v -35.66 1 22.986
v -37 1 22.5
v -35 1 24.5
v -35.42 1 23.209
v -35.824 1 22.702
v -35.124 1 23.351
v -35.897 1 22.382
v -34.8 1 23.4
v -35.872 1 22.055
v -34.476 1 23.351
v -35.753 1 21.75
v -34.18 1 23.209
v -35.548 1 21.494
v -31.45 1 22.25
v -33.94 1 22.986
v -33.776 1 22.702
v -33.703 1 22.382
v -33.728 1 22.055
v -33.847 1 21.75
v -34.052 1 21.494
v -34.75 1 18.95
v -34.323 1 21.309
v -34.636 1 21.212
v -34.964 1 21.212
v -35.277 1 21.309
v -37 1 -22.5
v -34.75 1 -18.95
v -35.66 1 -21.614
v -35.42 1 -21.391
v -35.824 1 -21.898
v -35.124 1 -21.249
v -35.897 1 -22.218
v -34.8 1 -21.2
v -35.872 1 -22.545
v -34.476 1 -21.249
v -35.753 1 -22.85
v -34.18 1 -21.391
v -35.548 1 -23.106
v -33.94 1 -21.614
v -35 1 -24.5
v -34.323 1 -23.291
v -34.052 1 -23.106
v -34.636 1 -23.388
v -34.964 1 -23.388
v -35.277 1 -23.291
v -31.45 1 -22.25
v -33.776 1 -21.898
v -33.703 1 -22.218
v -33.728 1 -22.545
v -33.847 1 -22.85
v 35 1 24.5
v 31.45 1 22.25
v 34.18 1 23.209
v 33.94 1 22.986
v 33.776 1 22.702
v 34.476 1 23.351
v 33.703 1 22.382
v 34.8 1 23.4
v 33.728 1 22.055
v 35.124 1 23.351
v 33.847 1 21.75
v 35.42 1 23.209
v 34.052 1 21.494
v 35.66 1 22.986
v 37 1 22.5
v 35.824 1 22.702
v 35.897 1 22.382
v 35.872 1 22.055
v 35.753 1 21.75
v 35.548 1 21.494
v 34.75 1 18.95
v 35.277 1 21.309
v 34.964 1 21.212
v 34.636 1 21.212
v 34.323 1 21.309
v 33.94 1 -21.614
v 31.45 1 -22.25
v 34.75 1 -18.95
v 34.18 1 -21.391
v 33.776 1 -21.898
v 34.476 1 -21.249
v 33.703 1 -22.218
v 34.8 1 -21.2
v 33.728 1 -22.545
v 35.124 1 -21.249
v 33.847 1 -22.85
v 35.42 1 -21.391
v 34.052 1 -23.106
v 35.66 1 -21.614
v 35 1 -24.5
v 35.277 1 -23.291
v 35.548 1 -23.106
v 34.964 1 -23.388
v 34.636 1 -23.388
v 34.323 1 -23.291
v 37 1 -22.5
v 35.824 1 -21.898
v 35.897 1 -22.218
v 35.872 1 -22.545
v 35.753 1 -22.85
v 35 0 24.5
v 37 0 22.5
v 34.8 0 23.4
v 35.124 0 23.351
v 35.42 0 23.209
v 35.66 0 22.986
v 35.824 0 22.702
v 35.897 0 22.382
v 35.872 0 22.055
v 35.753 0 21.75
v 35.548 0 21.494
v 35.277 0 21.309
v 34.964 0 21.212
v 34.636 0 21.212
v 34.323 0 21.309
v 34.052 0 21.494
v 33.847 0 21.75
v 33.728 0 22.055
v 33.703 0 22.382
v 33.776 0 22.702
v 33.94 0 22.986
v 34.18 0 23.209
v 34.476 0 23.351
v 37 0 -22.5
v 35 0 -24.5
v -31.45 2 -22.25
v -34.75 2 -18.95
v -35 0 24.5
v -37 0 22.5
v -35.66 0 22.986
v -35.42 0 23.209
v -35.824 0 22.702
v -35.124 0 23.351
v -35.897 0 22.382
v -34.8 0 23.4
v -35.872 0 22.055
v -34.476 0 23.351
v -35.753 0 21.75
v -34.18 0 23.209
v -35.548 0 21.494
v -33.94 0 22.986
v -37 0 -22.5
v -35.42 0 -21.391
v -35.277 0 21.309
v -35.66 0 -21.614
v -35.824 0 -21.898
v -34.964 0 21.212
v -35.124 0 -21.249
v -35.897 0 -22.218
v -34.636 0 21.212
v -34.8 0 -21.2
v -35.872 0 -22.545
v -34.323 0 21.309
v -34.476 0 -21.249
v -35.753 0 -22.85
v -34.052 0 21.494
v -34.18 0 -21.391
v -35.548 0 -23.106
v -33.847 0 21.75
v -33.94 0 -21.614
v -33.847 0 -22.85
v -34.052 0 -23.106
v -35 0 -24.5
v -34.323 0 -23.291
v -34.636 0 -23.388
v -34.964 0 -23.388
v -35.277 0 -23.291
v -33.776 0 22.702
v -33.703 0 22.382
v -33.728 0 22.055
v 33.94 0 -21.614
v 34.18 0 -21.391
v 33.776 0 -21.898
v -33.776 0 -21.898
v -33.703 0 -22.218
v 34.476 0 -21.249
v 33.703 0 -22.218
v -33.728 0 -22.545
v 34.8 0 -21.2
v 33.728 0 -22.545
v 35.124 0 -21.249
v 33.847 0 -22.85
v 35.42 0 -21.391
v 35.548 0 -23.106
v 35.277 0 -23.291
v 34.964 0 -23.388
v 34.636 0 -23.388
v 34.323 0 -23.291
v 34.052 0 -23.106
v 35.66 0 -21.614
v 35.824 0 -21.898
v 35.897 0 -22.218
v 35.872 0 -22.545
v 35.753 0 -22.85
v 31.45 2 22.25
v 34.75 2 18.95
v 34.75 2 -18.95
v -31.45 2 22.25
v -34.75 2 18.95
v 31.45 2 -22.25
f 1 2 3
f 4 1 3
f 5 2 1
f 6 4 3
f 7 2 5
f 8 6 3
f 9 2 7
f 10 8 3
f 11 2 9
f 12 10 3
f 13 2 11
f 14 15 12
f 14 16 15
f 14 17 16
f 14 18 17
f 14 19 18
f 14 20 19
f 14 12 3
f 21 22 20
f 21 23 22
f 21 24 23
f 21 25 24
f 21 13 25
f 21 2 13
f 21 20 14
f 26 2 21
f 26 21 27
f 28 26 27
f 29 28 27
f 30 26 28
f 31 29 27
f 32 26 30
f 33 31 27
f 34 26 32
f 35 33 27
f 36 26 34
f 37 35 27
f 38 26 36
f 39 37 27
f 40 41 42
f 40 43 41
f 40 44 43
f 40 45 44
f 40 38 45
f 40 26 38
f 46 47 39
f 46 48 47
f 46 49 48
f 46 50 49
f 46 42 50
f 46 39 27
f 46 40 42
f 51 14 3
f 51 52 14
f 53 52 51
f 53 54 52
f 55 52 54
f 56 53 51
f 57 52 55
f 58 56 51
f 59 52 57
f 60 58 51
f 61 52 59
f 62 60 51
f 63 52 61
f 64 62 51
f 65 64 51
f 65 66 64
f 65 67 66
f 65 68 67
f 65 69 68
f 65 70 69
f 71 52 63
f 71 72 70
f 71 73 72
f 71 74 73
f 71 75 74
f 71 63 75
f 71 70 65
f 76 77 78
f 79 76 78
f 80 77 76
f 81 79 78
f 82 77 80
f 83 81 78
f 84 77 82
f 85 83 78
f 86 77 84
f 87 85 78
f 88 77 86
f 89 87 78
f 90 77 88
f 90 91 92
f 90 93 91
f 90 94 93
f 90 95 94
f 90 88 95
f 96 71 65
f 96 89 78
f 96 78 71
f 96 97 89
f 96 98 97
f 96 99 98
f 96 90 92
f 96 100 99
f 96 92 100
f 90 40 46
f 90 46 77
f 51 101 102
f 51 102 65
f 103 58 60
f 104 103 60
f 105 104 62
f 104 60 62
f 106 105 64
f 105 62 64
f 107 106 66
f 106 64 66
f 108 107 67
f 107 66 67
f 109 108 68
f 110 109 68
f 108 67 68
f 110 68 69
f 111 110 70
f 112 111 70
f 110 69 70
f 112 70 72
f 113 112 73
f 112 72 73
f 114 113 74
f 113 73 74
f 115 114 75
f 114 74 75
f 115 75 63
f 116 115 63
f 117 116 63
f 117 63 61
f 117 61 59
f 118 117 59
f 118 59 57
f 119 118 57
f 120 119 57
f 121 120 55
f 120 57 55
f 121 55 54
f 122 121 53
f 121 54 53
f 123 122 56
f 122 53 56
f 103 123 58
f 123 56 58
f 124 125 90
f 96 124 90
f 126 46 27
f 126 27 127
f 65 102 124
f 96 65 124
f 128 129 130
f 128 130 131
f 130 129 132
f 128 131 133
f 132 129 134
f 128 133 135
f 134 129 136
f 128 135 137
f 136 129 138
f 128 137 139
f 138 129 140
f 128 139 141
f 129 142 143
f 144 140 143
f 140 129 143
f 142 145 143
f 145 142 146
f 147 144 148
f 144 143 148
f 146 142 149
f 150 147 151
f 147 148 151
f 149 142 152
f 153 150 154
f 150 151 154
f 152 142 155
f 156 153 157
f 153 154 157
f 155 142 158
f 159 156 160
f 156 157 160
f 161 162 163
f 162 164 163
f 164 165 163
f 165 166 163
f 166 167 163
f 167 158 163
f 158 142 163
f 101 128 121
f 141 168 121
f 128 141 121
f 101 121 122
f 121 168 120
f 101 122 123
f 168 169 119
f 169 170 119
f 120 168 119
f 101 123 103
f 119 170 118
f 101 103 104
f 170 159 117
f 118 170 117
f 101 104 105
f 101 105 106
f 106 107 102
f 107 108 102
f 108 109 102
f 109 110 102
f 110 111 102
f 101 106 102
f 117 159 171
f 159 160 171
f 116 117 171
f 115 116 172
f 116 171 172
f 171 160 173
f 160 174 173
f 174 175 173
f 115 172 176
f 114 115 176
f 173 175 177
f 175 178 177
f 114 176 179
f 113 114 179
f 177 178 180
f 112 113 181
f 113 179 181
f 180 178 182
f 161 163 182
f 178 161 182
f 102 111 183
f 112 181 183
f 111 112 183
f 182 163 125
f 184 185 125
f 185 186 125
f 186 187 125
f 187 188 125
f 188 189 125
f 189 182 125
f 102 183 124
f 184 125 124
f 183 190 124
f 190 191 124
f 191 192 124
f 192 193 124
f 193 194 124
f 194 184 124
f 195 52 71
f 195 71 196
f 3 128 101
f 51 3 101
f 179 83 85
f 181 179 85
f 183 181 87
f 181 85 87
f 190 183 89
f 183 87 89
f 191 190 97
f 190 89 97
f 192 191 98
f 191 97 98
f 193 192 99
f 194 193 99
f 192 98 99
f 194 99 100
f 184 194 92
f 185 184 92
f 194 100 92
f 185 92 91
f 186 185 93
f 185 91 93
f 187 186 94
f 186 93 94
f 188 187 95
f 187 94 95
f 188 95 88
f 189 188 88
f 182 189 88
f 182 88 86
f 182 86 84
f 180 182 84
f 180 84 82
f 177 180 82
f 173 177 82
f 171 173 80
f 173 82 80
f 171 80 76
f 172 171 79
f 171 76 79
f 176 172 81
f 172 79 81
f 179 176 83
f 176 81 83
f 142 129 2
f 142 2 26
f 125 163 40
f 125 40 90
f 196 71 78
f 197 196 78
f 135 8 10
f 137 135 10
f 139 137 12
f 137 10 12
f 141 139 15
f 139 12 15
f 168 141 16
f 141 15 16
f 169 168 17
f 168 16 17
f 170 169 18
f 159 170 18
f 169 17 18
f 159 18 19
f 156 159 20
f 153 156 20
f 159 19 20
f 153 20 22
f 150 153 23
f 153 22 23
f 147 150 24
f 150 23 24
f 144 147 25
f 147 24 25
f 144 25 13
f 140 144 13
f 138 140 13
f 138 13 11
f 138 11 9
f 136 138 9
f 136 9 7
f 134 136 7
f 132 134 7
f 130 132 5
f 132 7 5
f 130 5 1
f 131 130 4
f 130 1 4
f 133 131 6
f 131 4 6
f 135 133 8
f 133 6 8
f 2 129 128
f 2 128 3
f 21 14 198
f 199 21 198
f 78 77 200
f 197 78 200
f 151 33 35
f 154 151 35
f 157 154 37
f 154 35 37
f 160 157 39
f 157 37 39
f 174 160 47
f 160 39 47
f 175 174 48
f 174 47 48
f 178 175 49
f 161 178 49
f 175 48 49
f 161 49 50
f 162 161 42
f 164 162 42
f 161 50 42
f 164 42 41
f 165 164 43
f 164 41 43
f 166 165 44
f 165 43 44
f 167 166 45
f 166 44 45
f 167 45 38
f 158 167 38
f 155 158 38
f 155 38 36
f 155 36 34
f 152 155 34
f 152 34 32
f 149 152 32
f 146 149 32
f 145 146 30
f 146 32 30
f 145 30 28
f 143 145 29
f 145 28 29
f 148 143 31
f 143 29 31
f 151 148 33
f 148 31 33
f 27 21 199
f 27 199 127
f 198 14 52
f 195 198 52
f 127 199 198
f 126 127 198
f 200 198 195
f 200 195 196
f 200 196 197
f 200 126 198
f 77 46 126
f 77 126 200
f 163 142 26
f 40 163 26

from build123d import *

# Parameters (mm, degrees)
SKETCH1_W           = 74
SKETCH1_H           = 49
BOSS_EXTRUDE1_DEPTH = 1
SKETCH2_W           = 69.5
SKETCH2_H           = 44.5
BOSS_EXTRUDE2_DEPTH = 1
CHAMFER1_SIZE       = 2
CHAMFER2_SIZE       = 3.3
SKETCH3_R           = 1.1
CUT_EXTRUDE1_DEPTH  = 1


with BuildPart() as part:
    # Sketch1 → Boss-Extrude1 (new body)
    with BuildSketch(Plane(origin=(0, 0, 0), x_dir=(1, 0, 0), z_dir=(0, 1, 0))):
        Rectangle(SKETCH1_W, SKETCH1_H)
    extrude(amount=BOSS_EXTRUDE1_DEPTH)

    # Sketch2 → Boss-Extrude2 (add)
    with BuildSketch(Plane(origin=(0, 1, 0), x_dir=(1, 0, 0), z_dir=(0, 1, 0))):
        Rectangle(SKETCH2_W, SKETCH2_H)
    extrude(amount=BOSS_EXTRUDE2_DEPTH)

    # Chamfer1
    chamfer1_edges = [part.edges().sort_by_distance(p)[0] for p in [
        (37, 0.5, 24.5),
        (-37, 0.5, 24.5),
        (-37, 0.5, -24.5),
        (37, 0.5, -24.5),
    ]]
    chamfer(chamfer1_edges, length=CHAMFER1_SIZE)

    # Chamfer2
    chamfer2_edges = [part.edges().sort_by_distance(p)[0] for p in [
        (34.75, 1.5, 22.25),
        (34.75, 1.5, -22.25),
        (-34.75, 1.5, -22.25),
        (-34.75, 1.5, 22.25),
    ]]
    chamfer(chamfer2_edges, length=CHAMFER2_SIZE)

    # Sketch3 → Cut-Extrude1 (cut)
    with BuildSketch(Plane(origin=(0, 1, 0), x_dir=(1, 0, 0), z_dir=(0, 1, 0))):
        with Locations(Location((-34.8, 22.3, 0), (0, 0, 270))):
            Circle(SKETCH3_R)
        with Locations(Location((34.8, 22.3, 0), (0, 0, 270))):
            Circle(SKETCH3_R)
        with Locations(Location((34.8, -22.3, 0), (0, 0, 270))):
            Circle(SKETCH3_R)
        with Locations(Location((-34.8, -22.3, 0), (0, 0, 270))):
            Circle(SKETCH3_R)
    extrude(amount=-CUT_EXTRUDE1_DEPTH, mode=Mode.SUBTRACT)


solid = part.part
